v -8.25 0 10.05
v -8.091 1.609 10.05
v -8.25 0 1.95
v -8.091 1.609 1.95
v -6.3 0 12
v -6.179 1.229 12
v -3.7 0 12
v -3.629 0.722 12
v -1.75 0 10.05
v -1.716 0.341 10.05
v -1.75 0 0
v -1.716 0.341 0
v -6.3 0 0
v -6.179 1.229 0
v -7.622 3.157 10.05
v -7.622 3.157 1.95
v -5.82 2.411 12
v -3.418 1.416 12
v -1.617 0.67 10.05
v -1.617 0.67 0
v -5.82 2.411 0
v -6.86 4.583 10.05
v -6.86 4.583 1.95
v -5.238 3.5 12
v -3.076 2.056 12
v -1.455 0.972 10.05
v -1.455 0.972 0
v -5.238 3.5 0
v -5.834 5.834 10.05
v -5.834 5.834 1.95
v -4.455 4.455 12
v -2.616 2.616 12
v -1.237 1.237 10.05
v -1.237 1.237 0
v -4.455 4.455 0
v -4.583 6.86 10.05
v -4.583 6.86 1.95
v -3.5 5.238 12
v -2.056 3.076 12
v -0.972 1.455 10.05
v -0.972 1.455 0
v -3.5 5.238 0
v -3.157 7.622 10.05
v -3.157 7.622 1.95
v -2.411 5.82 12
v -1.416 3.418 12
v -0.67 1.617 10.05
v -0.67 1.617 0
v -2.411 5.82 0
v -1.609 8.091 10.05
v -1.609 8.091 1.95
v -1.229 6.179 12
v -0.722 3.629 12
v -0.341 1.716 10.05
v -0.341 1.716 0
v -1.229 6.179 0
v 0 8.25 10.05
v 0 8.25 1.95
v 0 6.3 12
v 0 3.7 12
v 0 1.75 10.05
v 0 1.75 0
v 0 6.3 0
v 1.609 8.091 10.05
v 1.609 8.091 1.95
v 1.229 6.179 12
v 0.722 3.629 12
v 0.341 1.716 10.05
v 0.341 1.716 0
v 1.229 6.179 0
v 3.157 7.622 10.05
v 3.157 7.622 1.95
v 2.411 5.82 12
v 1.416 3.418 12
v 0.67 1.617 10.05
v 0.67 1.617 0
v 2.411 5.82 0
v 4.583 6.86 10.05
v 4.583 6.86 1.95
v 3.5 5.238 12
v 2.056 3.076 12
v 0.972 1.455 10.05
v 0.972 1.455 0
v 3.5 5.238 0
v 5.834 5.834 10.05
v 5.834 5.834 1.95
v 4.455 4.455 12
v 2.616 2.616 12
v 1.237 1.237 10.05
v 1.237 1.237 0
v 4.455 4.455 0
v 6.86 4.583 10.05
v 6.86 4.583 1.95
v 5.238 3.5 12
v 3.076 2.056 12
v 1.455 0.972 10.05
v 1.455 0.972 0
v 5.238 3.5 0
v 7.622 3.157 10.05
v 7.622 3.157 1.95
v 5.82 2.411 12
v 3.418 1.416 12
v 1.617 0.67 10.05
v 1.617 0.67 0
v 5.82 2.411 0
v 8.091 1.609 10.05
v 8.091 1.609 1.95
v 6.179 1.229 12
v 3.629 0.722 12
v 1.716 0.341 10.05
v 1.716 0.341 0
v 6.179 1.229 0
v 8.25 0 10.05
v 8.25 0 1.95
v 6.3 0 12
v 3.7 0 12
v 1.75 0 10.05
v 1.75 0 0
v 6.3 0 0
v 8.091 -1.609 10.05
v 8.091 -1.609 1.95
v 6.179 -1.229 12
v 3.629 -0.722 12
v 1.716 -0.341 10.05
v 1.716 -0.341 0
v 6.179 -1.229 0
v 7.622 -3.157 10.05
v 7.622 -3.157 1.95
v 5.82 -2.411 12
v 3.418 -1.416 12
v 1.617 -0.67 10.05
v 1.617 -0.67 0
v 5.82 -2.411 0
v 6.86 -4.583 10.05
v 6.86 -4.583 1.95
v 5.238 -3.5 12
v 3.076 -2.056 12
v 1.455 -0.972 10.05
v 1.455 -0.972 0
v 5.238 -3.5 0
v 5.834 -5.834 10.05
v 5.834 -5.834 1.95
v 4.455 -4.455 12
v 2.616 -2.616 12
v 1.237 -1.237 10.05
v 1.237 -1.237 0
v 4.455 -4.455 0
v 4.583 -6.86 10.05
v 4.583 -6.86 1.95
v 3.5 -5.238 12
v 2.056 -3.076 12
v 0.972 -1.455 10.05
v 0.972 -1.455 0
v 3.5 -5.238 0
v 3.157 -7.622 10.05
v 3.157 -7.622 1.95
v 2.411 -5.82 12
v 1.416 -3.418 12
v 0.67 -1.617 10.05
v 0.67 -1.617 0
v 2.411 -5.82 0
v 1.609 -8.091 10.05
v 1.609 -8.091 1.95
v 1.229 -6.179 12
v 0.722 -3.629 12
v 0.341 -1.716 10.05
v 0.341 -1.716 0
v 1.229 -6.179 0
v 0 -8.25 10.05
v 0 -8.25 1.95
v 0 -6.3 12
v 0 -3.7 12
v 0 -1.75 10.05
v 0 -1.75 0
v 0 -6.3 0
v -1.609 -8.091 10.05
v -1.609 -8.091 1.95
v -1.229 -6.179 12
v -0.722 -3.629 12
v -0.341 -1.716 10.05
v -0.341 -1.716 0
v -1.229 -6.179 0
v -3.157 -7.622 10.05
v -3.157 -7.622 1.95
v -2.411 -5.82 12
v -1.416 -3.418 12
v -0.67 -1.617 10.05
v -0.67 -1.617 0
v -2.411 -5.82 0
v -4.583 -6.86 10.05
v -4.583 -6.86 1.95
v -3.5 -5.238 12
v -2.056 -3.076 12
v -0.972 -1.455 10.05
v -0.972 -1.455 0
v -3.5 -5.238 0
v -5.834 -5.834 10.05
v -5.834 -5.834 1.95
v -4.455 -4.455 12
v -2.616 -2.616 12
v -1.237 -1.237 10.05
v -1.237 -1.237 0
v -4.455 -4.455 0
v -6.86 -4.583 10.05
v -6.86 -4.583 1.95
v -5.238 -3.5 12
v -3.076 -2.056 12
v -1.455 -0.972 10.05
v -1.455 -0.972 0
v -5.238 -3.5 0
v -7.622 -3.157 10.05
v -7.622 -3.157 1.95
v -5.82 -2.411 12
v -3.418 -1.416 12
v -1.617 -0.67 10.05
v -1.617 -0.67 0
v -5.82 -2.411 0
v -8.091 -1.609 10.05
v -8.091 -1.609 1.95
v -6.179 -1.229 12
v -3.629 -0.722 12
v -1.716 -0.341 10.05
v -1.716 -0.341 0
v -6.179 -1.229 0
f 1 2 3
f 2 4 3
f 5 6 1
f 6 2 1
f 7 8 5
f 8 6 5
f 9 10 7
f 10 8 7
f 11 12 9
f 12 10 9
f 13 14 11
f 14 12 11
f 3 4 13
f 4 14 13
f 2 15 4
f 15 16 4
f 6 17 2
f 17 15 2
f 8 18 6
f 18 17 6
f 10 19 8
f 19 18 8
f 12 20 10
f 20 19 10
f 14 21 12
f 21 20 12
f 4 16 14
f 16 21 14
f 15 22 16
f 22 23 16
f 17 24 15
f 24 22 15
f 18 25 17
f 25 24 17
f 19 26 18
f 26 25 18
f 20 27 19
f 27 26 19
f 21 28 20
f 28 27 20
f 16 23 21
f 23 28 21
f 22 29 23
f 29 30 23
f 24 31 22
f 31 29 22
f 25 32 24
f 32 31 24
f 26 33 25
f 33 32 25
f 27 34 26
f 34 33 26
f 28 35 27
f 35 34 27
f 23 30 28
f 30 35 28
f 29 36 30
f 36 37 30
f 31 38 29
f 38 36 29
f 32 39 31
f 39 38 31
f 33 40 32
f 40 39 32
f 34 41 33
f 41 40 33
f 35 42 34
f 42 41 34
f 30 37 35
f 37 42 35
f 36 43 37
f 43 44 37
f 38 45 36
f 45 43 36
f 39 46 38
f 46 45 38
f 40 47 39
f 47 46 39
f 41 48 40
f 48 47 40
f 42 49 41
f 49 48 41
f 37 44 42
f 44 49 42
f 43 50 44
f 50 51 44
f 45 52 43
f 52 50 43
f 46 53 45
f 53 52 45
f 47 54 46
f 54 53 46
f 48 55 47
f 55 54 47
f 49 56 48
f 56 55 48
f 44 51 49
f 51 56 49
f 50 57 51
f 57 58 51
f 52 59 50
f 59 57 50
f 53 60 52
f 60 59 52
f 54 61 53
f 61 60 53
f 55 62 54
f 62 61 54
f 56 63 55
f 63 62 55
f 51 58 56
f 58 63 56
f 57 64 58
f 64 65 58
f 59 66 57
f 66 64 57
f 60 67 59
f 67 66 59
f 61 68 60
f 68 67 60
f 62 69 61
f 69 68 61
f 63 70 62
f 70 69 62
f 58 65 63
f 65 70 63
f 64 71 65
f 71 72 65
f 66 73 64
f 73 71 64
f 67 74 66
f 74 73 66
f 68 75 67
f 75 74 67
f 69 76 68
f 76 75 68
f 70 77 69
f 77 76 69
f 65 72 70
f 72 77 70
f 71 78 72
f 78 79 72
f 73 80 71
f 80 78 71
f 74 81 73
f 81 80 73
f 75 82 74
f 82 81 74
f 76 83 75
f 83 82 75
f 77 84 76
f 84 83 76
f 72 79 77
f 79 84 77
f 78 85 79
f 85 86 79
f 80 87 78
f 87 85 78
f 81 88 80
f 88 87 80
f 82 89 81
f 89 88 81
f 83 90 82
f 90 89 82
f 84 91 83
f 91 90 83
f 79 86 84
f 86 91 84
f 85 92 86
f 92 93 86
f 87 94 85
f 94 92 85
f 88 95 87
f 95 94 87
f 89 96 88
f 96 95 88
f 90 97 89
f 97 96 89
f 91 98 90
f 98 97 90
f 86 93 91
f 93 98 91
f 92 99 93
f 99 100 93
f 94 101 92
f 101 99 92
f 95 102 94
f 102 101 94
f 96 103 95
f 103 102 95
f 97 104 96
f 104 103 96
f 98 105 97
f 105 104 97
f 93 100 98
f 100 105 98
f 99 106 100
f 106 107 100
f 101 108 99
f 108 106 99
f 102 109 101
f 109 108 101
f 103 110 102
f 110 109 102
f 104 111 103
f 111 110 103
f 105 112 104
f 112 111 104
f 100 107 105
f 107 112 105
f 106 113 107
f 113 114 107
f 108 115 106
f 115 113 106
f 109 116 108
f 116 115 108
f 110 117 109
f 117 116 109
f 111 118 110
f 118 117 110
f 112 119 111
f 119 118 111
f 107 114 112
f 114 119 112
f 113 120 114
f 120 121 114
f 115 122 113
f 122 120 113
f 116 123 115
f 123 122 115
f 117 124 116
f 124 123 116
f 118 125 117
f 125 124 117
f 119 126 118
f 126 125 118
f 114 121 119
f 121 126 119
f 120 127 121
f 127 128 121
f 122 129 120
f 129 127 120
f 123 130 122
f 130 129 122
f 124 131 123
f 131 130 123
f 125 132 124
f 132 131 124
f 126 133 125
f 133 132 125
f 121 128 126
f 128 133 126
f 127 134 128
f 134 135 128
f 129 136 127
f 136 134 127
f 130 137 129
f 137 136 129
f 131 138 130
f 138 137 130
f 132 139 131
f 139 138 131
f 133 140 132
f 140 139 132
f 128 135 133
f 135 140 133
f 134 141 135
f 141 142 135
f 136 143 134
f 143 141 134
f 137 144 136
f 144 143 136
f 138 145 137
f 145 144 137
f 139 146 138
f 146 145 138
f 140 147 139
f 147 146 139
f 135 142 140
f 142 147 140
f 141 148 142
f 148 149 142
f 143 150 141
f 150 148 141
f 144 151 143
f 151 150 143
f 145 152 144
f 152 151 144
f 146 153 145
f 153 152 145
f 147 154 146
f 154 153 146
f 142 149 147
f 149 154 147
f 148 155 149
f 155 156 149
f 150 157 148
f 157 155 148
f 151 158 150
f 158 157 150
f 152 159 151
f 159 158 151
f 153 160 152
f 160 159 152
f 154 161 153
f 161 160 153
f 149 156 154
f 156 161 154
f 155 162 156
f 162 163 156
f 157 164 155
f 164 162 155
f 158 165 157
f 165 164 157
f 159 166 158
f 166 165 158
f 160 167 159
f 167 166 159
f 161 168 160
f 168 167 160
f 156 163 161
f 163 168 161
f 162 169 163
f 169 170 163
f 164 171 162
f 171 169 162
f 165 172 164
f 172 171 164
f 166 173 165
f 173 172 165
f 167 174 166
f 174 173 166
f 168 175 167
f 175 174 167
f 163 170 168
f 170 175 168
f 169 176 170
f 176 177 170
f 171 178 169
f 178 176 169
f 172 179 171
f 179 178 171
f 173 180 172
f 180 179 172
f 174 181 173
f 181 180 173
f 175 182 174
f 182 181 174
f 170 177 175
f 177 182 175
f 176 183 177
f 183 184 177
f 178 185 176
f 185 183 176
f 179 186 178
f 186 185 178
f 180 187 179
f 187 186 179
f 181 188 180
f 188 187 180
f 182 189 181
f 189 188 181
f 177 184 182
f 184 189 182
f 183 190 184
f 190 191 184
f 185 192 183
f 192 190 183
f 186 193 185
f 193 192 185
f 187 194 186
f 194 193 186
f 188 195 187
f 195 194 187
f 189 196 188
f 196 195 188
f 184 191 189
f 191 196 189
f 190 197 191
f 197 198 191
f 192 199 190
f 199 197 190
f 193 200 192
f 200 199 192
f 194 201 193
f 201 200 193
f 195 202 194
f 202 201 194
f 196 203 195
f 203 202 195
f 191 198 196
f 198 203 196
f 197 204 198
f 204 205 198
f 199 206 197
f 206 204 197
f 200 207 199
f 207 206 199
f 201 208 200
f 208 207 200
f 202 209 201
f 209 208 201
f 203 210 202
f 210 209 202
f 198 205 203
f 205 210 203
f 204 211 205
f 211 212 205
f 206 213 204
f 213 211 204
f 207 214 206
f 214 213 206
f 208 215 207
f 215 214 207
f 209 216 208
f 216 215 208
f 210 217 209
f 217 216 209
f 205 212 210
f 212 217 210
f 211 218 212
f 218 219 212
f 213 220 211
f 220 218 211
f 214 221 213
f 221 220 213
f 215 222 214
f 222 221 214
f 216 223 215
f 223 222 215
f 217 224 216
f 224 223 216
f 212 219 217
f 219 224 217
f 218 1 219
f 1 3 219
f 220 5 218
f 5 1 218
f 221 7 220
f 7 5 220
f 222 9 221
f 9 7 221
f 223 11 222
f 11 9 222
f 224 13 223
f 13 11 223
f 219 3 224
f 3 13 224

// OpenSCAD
$fn = 32;

// ----------------------------------------------------------------------
// Form washer: chamfered washer, 16.5 mm outside, 3.5 mm bore
// ----------------------------------------------------------------------

// --- parameters (mm) ---
revolve_angle = 360;      // full turn around the Z axis
profile_points = 7;       // points of the closed outline

profile = [[1.75, 0], [6.3, 0], [8.25, 1.95], [8.25, 10.05], [6.3, 12], [3.7, 12], [1.75, 10.05]];  // single closed polygon, 7 points, counter clockwise

// --- the one profile operation ---
rotate_extrude(angle = revolve_angle) polygon(points = profile);
